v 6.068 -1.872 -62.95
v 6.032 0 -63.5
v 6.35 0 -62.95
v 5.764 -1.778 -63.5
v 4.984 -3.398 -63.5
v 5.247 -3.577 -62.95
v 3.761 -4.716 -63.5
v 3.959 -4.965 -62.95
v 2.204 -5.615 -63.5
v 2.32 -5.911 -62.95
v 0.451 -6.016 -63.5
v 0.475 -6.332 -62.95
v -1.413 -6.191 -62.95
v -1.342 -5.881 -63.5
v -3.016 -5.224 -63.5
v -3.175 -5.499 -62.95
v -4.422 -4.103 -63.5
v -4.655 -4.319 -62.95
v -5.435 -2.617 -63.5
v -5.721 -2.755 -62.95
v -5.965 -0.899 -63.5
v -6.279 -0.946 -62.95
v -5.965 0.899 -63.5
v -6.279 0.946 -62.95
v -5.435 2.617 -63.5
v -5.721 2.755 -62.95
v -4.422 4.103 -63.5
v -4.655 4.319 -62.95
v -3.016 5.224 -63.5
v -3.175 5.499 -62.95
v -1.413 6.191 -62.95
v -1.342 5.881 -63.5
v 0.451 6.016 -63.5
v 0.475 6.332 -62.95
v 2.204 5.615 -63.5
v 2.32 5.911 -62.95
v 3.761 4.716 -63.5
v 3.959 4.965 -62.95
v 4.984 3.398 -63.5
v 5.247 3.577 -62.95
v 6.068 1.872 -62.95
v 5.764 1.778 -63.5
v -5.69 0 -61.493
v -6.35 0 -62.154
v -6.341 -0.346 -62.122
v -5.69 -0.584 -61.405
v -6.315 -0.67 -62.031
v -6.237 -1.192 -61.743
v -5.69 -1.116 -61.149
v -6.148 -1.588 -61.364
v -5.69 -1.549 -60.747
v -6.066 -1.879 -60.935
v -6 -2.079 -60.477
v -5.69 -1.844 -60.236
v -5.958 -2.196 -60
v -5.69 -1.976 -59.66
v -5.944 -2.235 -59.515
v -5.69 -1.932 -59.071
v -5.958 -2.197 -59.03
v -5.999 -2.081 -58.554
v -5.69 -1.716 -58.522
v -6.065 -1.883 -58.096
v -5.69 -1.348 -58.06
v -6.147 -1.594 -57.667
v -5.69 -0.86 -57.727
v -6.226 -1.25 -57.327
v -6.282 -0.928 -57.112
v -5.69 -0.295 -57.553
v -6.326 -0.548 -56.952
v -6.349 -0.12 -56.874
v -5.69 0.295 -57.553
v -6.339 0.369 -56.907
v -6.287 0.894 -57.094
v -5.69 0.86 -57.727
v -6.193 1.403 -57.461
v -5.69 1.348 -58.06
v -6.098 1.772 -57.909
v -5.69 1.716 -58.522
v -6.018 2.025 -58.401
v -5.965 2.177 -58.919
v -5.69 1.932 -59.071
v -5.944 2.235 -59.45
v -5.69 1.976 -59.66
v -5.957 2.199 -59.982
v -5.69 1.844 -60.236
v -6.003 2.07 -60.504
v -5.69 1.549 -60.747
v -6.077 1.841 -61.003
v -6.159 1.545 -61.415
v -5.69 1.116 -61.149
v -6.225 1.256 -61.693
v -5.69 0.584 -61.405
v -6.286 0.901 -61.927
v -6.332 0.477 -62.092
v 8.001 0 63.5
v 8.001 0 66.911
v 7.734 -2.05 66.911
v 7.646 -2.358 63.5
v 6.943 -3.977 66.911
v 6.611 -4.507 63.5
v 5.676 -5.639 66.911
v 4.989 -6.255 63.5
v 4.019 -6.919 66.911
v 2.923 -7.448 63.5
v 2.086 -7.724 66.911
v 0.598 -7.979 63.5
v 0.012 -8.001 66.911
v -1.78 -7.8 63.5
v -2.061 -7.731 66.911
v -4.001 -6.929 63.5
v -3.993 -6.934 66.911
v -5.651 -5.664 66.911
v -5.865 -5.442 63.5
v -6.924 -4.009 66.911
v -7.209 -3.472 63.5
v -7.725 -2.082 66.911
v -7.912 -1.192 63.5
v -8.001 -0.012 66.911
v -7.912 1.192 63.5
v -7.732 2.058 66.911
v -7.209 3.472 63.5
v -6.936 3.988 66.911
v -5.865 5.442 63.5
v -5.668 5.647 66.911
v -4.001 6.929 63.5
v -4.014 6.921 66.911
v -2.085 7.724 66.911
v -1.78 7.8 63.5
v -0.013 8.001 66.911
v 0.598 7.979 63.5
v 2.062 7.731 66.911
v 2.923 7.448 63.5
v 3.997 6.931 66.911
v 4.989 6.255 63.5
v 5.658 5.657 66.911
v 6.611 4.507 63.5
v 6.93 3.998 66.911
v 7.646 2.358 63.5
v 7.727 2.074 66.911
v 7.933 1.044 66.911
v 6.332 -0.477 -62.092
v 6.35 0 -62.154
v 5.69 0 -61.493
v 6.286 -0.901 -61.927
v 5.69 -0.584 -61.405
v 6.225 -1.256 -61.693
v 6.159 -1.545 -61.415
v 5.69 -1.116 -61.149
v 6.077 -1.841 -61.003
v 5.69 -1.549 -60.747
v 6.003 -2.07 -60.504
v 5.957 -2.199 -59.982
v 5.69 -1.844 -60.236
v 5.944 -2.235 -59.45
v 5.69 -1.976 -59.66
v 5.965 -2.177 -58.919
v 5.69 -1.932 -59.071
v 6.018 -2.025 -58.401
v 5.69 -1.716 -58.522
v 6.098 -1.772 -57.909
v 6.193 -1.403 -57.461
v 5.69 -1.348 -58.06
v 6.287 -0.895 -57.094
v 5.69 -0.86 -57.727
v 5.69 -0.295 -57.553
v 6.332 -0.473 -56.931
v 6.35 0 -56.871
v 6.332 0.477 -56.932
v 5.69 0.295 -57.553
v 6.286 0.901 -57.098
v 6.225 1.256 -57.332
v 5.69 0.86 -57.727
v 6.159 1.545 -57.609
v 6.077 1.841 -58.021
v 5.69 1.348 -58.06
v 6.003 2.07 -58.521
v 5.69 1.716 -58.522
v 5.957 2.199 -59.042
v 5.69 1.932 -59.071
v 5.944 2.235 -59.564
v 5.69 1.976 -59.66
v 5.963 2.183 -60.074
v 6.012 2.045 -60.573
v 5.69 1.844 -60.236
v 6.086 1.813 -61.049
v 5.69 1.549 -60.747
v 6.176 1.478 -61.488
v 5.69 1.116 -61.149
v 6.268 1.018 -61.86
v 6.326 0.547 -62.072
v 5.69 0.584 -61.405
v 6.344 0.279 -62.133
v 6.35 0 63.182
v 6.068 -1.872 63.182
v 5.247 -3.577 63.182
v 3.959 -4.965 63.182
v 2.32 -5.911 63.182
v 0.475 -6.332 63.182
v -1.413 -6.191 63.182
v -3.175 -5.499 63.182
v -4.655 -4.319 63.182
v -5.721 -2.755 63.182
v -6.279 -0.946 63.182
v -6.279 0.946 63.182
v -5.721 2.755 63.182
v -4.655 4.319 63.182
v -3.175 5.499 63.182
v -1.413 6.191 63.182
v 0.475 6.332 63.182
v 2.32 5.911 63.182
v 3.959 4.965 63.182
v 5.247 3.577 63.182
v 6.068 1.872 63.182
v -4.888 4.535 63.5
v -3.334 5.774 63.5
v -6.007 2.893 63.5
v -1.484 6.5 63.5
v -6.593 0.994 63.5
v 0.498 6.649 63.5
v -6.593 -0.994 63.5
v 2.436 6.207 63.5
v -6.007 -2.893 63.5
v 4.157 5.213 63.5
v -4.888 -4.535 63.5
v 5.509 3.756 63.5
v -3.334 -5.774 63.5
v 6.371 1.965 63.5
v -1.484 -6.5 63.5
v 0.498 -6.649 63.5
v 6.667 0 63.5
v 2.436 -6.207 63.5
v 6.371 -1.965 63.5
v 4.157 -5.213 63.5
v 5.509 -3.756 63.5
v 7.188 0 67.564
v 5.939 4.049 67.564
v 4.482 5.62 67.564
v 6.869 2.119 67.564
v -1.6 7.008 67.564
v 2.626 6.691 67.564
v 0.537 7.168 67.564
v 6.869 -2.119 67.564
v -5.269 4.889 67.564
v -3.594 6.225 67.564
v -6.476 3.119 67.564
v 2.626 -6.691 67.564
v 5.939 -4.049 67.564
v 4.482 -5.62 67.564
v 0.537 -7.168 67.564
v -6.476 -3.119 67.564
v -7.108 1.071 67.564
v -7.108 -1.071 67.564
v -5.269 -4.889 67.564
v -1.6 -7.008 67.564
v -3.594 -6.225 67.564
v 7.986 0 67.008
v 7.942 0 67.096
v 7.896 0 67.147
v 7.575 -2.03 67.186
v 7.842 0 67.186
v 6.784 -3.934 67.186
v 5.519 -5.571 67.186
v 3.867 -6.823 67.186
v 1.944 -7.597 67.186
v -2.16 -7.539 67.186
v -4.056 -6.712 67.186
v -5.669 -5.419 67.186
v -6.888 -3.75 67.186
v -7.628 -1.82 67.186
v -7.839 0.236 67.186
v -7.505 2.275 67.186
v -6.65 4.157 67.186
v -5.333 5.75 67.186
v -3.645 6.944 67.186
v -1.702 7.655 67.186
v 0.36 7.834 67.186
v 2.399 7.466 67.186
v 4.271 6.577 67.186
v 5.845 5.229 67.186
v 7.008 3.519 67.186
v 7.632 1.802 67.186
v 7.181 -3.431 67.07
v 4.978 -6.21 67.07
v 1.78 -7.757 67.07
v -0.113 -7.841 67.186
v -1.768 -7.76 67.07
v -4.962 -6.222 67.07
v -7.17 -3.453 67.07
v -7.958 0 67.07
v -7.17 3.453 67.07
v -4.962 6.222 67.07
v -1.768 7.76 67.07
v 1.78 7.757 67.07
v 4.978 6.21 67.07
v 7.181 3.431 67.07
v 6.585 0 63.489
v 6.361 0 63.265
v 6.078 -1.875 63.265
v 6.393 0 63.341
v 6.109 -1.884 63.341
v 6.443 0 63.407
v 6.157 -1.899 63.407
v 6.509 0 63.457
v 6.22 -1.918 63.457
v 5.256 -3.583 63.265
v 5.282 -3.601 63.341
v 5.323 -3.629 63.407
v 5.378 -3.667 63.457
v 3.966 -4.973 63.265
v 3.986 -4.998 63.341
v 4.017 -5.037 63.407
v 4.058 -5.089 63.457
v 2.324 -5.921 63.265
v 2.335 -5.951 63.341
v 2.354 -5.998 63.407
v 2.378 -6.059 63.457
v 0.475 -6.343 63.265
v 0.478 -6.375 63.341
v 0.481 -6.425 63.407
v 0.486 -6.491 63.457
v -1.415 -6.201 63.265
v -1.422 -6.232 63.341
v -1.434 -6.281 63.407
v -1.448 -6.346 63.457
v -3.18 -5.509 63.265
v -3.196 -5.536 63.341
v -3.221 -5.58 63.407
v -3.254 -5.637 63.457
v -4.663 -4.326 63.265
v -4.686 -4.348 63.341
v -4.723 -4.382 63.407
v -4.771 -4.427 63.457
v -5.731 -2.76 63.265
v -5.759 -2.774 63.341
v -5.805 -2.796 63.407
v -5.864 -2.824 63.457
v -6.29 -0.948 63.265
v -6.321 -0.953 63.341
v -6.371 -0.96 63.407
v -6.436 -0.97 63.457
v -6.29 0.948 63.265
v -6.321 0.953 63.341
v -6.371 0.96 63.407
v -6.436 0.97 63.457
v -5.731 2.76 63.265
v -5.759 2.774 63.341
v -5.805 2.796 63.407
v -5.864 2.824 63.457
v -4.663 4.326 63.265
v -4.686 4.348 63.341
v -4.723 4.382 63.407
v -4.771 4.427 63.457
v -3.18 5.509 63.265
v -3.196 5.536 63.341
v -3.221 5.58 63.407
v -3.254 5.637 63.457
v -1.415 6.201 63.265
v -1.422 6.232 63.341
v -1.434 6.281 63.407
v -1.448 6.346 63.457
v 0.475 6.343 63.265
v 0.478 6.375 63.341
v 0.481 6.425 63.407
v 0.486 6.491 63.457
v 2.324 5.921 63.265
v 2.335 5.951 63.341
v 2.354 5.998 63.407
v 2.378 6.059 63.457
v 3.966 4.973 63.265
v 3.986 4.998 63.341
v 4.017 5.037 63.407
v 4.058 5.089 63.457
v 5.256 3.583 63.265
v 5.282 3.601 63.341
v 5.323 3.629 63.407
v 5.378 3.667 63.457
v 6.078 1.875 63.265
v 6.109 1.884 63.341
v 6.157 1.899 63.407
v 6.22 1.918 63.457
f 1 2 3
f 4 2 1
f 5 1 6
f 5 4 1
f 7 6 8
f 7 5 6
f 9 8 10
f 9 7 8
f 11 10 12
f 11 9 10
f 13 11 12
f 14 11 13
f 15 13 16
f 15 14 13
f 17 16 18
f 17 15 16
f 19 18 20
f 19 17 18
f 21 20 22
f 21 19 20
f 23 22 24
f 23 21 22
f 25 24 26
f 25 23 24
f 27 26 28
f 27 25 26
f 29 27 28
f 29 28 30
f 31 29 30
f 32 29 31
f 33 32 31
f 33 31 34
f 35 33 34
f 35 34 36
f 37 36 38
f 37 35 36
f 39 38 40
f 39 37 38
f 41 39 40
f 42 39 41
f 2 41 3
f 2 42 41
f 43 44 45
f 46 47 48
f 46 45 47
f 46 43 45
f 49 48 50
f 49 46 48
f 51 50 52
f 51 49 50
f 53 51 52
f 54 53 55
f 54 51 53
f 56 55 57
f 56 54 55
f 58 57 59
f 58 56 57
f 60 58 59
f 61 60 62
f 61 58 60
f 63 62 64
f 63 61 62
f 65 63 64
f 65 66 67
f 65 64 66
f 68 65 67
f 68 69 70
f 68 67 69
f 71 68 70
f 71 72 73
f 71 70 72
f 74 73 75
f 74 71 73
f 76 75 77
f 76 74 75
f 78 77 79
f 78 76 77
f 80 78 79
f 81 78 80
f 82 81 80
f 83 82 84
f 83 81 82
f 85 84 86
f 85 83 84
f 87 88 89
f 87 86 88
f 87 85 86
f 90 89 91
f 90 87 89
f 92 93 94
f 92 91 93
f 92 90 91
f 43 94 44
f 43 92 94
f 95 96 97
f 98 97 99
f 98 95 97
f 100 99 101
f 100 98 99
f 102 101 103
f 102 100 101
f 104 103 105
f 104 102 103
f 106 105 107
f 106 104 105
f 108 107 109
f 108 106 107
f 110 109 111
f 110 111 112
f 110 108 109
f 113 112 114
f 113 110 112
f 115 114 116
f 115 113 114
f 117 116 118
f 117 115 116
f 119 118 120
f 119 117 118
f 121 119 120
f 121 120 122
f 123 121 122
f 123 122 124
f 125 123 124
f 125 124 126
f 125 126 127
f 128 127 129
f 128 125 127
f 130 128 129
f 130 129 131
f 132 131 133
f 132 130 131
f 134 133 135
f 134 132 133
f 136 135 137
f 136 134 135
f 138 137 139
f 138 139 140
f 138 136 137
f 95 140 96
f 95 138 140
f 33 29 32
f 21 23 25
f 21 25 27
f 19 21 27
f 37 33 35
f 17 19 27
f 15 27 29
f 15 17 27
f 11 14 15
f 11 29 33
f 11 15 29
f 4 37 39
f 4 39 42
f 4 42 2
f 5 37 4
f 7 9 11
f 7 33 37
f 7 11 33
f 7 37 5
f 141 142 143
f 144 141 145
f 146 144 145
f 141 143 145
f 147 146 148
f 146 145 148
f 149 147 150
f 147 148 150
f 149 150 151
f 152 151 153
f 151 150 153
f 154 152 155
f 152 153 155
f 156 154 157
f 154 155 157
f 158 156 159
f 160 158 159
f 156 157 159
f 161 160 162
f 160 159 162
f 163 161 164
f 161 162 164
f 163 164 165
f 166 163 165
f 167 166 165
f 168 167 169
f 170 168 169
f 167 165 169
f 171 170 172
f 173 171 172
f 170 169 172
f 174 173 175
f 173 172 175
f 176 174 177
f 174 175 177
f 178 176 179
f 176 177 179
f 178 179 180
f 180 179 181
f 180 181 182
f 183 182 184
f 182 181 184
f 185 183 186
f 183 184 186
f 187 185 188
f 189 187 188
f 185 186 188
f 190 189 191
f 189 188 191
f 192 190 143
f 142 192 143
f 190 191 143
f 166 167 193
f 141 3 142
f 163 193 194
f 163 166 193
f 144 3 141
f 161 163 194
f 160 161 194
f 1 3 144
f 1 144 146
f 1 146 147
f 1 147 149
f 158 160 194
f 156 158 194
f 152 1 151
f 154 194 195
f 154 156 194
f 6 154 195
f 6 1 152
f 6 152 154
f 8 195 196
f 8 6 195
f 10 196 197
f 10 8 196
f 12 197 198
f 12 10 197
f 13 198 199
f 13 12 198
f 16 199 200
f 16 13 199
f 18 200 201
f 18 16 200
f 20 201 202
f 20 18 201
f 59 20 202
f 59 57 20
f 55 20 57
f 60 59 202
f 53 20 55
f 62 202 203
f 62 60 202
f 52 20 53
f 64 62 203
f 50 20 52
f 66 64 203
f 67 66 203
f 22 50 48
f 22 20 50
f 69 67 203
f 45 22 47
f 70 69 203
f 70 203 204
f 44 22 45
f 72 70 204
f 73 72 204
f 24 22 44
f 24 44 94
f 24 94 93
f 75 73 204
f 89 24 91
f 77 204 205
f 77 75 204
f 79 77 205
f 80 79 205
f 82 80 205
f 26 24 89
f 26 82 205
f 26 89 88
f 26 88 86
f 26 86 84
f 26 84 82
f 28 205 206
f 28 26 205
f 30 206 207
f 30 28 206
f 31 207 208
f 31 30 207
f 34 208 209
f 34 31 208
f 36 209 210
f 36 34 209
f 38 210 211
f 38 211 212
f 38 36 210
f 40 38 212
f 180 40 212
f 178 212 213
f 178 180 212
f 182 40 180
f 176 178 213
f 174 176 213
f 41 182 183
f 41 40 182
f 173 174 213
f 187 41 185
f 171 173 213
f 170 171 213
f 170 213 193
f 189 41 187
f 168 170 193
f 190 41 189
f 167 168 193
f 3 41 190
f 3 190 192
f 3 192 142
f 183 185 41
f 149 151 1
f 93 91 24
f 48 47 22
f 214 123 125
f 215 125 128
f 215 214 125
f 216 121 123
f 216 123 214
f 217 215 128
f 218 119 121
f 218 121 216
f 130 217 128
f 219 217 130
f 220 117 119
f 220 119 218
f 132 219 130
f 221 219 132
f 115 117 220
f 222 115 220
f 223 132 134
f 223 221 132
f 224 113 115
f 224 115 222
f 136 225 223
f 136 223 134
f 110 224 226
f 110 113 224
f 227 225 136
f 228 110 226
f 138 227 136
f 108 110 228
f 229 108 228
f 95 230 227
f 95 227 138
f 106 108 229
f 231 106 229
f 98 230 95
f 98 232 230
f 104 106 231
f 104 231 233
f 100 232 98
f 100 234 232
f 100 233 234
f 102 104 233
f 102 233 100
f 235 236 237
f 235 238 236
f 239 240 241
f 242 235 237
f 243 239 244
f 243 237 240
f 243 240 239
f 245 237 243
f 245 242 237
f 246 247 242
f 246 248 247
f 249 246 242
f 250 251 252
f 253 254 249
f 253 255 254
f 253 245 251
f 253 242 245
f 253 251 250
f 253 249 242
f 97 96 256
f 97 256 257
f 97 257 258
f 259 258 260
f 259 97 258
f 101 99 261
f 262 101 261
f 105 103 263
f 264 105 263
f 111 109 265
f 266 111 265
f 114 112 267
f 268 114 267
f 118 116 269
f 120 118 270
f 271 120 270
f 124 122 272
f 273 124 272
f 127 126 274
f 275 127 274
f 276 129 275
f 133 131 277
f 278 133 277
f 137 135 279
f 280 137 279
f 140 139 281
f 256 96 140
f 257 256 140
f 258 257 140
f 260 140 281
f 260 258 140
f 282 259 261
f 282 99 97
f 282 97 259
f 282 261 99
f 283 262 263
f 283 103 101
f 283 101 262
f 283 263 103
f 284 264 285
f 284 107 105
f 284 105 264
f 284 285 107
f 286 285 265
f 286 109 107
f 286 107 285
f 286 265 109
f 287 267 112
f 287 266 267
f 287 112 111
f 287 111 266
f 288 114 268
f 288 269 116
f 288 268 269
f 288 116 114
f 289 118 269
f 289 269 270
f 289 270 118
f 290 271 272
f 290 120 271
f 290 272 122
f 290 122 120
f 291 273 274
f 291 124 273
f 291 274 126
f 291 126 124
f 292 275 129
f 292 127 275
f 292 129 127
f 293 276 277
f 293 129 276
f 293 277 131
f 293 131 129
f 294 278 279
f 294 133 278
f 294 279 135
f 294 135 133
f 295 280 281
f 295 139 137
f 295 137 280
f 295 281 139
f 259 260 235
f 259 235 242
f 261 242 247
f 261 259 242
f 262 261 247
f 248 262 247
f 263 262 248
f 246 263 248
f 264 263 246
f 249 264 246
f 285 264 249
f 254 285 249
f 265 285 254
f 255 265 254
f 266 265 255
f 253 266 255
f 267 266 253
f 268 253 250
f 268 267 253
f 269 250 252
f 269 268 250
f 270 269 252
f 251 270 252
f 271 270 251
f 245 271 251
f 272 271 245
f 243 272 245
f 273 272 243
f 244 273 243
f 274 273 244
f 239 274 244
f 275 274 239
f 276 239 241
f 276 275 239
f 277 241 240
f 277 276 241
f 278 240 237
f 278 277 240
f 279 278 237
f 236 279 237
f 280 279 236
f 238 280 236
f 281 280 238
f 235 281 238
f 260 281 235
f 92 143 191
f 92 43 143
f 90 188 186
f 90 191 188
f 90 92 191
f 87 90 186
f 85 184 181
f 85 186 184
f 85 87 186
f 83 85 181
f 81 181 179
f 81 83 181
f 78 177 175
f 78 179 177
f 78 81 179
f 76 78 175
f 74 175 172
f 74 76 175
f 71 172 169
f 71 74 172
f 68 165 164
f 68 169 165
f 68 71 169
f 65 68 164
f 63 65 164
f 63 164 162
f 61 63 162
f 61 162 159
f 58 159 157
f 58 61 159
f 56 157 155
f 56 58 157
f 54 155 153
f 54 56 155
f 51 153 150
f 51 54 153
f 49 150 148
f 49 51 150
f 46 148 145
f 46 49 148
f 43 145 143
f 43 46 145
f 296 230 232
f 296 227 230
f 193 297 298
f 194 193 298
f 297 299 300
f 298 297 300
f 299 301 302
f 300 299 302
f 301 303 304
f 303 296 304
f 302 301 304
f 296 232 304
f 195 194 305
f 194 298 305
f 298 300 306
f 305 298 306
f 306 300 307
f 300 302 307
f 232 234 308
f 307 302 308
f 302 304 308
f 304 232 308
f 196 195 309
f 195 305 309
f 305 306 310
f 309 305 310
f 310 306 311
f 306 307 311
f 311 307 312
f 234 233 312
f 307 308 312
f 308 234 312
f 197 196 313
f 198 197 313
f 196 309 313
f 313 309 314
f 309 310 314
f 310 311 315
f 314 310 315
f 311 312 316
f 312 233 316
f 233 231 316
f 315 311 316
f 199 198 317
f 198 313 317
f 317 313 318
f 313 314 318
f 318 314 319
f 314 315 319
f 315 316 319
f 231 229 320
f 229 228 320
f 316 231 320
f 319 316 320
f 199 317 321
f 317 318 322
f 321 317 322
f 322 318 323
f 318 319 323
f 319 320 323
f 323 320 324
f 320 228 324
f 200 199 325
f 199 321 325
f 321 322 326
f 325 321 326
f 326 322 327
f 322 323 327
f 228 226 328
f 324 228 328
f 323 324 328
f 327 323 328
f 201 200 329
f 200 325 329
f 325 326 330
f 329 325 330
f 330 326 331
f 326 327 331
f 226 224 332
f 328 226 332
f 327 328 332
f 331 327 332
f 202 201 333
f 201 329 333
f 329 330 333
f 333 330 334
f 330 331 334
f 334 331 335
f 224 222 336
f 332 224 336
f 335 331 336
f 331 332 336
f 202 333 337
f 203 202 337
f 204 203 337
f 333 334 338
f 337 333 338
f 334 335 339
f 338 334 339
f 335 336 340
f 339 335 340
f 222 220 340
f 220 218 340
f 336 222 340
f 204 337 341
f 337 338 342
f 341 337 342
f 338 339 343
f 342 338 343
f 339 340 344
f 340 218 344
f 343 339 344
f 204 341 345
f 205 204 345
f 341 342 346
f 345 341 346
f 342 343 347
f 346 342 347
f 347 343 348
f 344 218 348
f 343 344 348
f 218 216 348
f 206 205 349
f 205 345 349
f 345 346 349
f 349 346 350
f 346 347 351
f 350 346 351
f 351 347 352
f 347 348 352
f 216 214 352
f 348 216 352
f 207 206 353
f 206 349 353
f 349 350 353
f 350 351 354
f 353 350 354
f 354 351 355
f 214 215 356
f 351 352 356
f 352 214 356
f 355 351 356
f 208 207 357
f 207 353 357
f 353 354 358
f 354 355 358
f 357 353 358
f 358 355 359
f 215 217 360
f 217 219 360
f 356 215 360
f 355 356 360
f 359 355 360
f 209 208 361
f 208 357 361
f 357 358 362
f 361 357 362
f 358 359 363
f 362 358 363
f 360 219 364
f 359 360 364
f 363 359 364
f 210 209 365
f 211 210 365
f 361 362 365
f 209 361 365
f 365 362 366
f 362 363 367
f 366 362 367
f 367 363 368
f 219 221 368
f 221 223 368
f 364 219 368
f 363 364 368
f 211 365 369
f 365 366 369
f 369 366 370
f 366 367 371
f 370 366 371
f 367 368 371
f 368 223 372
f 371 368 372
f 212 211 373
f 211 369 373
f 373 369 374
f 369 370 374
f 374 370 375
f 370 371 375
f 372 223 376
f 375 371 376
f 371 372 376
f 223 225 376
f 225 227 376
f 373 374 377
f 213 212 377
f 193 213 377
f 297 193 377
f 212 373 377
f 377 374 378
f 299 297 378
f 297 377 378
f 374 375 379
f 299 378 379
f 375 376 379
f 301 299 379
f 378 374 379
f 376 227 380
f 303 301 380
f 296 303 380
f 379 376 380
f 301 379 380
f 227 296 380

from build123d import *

# Parameters (mm, degrees)
CUT_EXTRUDE1_DEPTH      = 69.504934844
CUT_EXTRUDE1_DEPTH_BACK = 69.504934844
SKETCH3_R               = 1.9812
FILLET1_R               = 0.3175


with BuildPart() as part:
    # Sketch2 → Revolve1 (revolve)
    with BuildSketch(Plane(origin=(0, 0, 0), x_dir=(0, 0, -1), z_dir=(1, 0, 0)), mode=Mode.PRIVATE) as revolve1_sk:
        Polygon((63.5, 6.0325), (63.5, 0), (-67.564, 0), (-67.564, 7.1882), (-67.094729701, 8.001), (-63.5, 8.001), (-63.5, 6.35), (62.950073869, 6.35), align=None)
    revolve(revolve1_sk.sketch.rotate(Axis((0, 0, 63.5), (0, 0, -1)), 90), axis=Axis((0, 0, 63.5), (0, 0, -1)))

    # Sketch3 → Cut-Extrude1 (cut, two sides: drawn at the far end of the back side and taken through both)
    with BuildSketch(Plane(origin=(0, 0, 0), x_dir=(0, 0, -1), z_dir=(1, 0, 0)).offset(-CUT_EXTRUDE1_DEPTH_BACK)):
        with Locations((59.5122, 0)):
            Circle(SKETCH3_R)
    extrude(amount=CUT_EXTRUDE1_DEPTH + CUT_EXTRUDE1_DEPTH_BACK, mode=Mode.SUBTRACT)

    # Fillet1
    fillet1_edges = [part.edges().sort_by_distance(p)[0] for p in [
        (-8.001, 0, 67.094729701),
        (-6.35, 0, 63.5),
    ]]
    fillet(fillet1_edges, radius=FILLET1_R)

    # Sketch4 → Cut-Revolve1 (revolve, cut)
    with BuildSketch(Plane(origin=(0, 0, 0), x_dir=(1, 0, 0), z_dir=(0, 1, 0)), mode=Mode.PRIVATE) as cut_revolve1_sk:
        Polygon((6.35, 59.5122), (6.35, 56.8706), (3.7084, 59.5122), align=None)
        Polygon((-6.35, 56.8706), (-3.7084, 59.5122), (-6.35, 59.5122), align=None)
    revolve(cut_revolve1_sk.sketch.rotate(Axis((6.35, 0, -59.5122), (-1, 0, 0)), 180), axis=Axis((6.35, 0, -59.5122), (-1, 0, 0)), mode=Mode.SUBTRACT)


solid = part.part
